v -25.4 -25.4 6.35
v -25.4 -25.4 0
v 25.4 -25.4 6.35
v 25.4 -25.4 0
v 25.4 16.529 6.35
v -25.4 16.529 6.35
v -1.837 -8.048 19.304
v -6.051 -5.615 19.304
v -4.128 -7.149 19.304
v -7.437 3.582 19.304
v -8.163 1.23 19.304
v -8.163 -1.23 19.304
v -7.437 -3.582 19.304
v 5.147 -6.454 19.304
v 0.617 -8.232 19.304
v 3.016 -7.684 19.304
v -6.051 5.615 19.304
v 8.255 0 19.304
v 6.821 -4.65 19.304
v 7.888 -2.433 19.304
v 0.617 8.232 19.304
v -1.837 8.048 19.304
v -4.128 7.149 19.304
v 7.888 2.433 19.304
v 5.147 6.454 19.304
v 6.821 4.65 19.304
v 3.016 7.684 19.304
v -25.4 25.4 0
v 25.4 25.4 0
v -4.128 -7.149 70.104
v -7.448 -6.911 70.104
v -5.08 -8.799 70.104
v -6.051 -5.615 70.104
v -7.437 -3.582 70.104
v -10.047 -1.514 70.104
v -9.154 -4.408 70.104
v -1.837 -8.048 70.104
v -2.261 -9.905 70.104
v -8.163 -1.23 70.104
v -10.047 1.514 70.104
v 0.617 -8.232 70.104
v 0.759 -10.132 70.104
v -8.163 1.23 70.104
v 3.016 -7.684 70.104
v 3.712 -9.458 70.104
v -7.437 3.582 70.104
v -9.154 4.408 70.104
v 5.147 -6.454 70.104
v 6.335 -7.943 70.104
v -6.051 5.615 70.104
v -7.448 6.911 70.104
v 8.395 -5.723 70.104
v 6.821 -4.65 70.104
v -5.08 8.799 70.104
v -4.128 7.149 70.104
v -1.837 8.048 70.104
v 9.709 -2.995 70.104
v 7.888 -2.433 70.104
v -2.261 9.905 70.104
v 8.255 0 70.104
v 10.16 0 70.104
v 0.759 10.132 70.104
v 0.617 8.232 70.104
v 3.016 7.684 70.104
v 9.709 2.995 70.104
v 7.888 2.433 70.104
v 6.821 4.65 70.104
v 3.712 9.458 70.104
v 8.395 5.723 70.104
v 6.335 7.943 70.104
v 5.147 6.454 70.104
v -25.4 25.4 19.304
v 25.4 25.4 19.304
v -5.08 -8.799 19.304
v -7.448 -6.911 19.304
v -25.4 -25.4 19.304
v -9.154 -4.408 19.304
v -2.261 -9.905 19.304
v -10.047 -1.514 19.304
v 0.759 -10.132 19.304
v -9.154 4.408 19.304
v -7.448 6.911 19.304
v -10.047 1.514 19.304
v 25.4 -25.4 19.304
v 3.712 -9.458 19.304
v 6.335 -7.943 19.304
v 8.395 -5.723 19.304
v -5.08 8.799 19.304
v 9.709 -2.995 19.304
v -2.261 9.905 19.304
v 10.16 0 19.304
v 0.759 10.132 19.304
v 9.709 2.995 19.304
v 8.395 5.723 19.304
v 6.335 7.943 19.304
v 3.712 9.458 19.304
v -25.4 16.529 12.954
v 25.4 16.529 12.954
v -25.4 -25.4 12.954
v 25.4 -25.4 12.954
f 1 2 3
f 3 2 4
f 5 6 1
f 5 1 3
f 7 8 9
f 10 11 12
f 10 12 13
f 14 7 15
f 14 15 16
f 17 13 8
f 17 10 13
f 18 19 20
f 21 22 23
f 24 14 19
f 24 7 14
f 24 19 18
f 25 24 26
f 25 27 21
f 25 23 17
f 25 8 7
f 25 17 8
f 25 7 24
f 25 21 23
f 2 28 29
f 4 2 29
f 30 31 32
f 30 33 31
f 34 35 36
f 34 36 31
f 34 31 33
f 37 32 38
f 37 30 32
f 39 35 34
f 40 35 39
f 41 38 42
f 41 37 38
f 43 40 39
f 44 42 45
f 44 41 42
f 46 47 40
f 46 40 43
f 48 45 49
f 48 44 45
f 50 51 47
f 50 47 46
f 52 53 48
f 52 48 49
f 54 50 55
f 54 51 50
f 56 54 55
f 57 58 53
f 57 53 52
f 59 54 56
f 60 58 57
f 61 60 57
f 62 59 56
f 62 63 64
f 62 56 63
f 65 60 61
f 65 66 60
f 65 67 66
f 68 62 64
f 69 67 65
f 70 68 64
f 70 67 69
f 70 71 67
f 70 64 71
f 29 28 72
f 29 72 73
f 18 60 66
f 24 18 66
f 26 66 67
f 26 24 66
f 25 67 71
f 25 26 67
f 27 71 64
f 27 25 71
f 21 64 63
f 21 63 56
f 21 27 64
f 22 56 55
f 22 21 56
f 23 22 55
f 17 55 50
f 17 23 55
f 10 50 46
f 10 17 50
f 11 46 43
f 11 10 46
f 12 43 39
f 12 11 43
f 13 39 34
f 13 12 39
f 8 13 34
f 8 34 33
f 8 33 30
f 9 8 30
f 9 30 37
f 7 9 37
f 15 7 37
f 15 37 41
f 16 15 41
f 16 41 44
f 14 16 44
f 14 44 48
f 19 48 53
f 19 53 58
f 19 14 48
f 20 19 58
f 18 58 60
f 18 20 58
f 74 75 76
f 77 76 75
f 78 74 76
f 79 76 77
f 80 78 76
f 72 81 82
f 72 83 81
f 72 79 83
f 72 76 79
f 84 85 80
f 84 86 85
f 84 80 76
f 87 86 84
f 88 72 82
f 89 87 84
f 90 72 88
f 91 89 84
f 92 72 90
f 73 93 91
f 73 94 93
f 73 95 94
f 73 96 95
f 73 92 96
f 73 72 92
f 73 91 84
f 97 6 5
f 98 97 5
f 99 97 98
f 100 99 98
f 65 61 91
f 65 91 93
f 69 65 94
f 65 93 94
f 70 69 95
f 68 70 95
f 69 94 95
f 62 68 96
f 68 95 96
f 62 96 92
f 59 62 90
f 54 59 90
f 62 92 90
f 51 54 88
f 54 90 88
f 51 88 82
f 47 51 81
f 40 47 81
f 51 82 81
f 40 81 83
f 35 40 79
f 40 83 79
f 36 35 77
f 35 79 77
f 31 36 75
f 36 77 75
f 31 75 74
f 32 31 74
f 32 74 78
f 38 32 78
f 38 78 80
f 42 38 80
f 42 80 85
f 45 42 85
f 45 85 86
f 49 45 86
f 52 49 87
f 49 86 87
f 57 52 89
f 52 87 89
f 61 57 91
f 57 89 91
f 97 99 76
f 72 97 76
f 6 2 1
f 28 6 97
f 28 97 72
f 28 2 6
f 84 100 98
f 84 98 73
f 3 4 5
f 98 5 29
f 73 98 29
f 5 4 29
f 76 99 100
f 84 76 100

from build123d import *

# Parameters (mm, degrees)
F0_W     = 50.8
F0_H     = 50.8
F1_DEPTH = 6.35
F2_W     = 50.8
F2_H     = 8.870684
F3_DEPTH = 6.604
F4_W     = 50.8
F4_H     = 50.8
F5_DEPTH = 6.35
F6_R     = 10.16
F6_R_2   = 8.255
F7_DEPTH = 50.8


with BuildPart() as f1:
    # F0 (on Top) → F1 (new body)
    with BuildSketch(Plane.XY):
        Rectangle(F0_W, F0_H)
    extrude(amount=F1_DEPTH)

    # F2 (on face) → F3 (join)
    with BuildSketch(Plane.XY.offset(6.35)):
        with Locations((0, 20.964658)):
            Rectangle(F2_W, F2_H)
    extrude(amount=F3_DEPTH)

    # F4 (on face) → F5 (join)
    with BuildSketch(Plane.XY.offset(12.954)):
        Rectangle(F4_W, F4_H)
    extrude(amount=F5_DEPTH)

    # F6 (on face) → F7 (join)
    with BuildSketch(Plane.XY.offset(19.304)):
        Circle(F6_R)
        Circle(F6_R_2, mode=Mode.SUBTRACT)
    extrude(amount=F7_DEPTH)


solid = f1.part
